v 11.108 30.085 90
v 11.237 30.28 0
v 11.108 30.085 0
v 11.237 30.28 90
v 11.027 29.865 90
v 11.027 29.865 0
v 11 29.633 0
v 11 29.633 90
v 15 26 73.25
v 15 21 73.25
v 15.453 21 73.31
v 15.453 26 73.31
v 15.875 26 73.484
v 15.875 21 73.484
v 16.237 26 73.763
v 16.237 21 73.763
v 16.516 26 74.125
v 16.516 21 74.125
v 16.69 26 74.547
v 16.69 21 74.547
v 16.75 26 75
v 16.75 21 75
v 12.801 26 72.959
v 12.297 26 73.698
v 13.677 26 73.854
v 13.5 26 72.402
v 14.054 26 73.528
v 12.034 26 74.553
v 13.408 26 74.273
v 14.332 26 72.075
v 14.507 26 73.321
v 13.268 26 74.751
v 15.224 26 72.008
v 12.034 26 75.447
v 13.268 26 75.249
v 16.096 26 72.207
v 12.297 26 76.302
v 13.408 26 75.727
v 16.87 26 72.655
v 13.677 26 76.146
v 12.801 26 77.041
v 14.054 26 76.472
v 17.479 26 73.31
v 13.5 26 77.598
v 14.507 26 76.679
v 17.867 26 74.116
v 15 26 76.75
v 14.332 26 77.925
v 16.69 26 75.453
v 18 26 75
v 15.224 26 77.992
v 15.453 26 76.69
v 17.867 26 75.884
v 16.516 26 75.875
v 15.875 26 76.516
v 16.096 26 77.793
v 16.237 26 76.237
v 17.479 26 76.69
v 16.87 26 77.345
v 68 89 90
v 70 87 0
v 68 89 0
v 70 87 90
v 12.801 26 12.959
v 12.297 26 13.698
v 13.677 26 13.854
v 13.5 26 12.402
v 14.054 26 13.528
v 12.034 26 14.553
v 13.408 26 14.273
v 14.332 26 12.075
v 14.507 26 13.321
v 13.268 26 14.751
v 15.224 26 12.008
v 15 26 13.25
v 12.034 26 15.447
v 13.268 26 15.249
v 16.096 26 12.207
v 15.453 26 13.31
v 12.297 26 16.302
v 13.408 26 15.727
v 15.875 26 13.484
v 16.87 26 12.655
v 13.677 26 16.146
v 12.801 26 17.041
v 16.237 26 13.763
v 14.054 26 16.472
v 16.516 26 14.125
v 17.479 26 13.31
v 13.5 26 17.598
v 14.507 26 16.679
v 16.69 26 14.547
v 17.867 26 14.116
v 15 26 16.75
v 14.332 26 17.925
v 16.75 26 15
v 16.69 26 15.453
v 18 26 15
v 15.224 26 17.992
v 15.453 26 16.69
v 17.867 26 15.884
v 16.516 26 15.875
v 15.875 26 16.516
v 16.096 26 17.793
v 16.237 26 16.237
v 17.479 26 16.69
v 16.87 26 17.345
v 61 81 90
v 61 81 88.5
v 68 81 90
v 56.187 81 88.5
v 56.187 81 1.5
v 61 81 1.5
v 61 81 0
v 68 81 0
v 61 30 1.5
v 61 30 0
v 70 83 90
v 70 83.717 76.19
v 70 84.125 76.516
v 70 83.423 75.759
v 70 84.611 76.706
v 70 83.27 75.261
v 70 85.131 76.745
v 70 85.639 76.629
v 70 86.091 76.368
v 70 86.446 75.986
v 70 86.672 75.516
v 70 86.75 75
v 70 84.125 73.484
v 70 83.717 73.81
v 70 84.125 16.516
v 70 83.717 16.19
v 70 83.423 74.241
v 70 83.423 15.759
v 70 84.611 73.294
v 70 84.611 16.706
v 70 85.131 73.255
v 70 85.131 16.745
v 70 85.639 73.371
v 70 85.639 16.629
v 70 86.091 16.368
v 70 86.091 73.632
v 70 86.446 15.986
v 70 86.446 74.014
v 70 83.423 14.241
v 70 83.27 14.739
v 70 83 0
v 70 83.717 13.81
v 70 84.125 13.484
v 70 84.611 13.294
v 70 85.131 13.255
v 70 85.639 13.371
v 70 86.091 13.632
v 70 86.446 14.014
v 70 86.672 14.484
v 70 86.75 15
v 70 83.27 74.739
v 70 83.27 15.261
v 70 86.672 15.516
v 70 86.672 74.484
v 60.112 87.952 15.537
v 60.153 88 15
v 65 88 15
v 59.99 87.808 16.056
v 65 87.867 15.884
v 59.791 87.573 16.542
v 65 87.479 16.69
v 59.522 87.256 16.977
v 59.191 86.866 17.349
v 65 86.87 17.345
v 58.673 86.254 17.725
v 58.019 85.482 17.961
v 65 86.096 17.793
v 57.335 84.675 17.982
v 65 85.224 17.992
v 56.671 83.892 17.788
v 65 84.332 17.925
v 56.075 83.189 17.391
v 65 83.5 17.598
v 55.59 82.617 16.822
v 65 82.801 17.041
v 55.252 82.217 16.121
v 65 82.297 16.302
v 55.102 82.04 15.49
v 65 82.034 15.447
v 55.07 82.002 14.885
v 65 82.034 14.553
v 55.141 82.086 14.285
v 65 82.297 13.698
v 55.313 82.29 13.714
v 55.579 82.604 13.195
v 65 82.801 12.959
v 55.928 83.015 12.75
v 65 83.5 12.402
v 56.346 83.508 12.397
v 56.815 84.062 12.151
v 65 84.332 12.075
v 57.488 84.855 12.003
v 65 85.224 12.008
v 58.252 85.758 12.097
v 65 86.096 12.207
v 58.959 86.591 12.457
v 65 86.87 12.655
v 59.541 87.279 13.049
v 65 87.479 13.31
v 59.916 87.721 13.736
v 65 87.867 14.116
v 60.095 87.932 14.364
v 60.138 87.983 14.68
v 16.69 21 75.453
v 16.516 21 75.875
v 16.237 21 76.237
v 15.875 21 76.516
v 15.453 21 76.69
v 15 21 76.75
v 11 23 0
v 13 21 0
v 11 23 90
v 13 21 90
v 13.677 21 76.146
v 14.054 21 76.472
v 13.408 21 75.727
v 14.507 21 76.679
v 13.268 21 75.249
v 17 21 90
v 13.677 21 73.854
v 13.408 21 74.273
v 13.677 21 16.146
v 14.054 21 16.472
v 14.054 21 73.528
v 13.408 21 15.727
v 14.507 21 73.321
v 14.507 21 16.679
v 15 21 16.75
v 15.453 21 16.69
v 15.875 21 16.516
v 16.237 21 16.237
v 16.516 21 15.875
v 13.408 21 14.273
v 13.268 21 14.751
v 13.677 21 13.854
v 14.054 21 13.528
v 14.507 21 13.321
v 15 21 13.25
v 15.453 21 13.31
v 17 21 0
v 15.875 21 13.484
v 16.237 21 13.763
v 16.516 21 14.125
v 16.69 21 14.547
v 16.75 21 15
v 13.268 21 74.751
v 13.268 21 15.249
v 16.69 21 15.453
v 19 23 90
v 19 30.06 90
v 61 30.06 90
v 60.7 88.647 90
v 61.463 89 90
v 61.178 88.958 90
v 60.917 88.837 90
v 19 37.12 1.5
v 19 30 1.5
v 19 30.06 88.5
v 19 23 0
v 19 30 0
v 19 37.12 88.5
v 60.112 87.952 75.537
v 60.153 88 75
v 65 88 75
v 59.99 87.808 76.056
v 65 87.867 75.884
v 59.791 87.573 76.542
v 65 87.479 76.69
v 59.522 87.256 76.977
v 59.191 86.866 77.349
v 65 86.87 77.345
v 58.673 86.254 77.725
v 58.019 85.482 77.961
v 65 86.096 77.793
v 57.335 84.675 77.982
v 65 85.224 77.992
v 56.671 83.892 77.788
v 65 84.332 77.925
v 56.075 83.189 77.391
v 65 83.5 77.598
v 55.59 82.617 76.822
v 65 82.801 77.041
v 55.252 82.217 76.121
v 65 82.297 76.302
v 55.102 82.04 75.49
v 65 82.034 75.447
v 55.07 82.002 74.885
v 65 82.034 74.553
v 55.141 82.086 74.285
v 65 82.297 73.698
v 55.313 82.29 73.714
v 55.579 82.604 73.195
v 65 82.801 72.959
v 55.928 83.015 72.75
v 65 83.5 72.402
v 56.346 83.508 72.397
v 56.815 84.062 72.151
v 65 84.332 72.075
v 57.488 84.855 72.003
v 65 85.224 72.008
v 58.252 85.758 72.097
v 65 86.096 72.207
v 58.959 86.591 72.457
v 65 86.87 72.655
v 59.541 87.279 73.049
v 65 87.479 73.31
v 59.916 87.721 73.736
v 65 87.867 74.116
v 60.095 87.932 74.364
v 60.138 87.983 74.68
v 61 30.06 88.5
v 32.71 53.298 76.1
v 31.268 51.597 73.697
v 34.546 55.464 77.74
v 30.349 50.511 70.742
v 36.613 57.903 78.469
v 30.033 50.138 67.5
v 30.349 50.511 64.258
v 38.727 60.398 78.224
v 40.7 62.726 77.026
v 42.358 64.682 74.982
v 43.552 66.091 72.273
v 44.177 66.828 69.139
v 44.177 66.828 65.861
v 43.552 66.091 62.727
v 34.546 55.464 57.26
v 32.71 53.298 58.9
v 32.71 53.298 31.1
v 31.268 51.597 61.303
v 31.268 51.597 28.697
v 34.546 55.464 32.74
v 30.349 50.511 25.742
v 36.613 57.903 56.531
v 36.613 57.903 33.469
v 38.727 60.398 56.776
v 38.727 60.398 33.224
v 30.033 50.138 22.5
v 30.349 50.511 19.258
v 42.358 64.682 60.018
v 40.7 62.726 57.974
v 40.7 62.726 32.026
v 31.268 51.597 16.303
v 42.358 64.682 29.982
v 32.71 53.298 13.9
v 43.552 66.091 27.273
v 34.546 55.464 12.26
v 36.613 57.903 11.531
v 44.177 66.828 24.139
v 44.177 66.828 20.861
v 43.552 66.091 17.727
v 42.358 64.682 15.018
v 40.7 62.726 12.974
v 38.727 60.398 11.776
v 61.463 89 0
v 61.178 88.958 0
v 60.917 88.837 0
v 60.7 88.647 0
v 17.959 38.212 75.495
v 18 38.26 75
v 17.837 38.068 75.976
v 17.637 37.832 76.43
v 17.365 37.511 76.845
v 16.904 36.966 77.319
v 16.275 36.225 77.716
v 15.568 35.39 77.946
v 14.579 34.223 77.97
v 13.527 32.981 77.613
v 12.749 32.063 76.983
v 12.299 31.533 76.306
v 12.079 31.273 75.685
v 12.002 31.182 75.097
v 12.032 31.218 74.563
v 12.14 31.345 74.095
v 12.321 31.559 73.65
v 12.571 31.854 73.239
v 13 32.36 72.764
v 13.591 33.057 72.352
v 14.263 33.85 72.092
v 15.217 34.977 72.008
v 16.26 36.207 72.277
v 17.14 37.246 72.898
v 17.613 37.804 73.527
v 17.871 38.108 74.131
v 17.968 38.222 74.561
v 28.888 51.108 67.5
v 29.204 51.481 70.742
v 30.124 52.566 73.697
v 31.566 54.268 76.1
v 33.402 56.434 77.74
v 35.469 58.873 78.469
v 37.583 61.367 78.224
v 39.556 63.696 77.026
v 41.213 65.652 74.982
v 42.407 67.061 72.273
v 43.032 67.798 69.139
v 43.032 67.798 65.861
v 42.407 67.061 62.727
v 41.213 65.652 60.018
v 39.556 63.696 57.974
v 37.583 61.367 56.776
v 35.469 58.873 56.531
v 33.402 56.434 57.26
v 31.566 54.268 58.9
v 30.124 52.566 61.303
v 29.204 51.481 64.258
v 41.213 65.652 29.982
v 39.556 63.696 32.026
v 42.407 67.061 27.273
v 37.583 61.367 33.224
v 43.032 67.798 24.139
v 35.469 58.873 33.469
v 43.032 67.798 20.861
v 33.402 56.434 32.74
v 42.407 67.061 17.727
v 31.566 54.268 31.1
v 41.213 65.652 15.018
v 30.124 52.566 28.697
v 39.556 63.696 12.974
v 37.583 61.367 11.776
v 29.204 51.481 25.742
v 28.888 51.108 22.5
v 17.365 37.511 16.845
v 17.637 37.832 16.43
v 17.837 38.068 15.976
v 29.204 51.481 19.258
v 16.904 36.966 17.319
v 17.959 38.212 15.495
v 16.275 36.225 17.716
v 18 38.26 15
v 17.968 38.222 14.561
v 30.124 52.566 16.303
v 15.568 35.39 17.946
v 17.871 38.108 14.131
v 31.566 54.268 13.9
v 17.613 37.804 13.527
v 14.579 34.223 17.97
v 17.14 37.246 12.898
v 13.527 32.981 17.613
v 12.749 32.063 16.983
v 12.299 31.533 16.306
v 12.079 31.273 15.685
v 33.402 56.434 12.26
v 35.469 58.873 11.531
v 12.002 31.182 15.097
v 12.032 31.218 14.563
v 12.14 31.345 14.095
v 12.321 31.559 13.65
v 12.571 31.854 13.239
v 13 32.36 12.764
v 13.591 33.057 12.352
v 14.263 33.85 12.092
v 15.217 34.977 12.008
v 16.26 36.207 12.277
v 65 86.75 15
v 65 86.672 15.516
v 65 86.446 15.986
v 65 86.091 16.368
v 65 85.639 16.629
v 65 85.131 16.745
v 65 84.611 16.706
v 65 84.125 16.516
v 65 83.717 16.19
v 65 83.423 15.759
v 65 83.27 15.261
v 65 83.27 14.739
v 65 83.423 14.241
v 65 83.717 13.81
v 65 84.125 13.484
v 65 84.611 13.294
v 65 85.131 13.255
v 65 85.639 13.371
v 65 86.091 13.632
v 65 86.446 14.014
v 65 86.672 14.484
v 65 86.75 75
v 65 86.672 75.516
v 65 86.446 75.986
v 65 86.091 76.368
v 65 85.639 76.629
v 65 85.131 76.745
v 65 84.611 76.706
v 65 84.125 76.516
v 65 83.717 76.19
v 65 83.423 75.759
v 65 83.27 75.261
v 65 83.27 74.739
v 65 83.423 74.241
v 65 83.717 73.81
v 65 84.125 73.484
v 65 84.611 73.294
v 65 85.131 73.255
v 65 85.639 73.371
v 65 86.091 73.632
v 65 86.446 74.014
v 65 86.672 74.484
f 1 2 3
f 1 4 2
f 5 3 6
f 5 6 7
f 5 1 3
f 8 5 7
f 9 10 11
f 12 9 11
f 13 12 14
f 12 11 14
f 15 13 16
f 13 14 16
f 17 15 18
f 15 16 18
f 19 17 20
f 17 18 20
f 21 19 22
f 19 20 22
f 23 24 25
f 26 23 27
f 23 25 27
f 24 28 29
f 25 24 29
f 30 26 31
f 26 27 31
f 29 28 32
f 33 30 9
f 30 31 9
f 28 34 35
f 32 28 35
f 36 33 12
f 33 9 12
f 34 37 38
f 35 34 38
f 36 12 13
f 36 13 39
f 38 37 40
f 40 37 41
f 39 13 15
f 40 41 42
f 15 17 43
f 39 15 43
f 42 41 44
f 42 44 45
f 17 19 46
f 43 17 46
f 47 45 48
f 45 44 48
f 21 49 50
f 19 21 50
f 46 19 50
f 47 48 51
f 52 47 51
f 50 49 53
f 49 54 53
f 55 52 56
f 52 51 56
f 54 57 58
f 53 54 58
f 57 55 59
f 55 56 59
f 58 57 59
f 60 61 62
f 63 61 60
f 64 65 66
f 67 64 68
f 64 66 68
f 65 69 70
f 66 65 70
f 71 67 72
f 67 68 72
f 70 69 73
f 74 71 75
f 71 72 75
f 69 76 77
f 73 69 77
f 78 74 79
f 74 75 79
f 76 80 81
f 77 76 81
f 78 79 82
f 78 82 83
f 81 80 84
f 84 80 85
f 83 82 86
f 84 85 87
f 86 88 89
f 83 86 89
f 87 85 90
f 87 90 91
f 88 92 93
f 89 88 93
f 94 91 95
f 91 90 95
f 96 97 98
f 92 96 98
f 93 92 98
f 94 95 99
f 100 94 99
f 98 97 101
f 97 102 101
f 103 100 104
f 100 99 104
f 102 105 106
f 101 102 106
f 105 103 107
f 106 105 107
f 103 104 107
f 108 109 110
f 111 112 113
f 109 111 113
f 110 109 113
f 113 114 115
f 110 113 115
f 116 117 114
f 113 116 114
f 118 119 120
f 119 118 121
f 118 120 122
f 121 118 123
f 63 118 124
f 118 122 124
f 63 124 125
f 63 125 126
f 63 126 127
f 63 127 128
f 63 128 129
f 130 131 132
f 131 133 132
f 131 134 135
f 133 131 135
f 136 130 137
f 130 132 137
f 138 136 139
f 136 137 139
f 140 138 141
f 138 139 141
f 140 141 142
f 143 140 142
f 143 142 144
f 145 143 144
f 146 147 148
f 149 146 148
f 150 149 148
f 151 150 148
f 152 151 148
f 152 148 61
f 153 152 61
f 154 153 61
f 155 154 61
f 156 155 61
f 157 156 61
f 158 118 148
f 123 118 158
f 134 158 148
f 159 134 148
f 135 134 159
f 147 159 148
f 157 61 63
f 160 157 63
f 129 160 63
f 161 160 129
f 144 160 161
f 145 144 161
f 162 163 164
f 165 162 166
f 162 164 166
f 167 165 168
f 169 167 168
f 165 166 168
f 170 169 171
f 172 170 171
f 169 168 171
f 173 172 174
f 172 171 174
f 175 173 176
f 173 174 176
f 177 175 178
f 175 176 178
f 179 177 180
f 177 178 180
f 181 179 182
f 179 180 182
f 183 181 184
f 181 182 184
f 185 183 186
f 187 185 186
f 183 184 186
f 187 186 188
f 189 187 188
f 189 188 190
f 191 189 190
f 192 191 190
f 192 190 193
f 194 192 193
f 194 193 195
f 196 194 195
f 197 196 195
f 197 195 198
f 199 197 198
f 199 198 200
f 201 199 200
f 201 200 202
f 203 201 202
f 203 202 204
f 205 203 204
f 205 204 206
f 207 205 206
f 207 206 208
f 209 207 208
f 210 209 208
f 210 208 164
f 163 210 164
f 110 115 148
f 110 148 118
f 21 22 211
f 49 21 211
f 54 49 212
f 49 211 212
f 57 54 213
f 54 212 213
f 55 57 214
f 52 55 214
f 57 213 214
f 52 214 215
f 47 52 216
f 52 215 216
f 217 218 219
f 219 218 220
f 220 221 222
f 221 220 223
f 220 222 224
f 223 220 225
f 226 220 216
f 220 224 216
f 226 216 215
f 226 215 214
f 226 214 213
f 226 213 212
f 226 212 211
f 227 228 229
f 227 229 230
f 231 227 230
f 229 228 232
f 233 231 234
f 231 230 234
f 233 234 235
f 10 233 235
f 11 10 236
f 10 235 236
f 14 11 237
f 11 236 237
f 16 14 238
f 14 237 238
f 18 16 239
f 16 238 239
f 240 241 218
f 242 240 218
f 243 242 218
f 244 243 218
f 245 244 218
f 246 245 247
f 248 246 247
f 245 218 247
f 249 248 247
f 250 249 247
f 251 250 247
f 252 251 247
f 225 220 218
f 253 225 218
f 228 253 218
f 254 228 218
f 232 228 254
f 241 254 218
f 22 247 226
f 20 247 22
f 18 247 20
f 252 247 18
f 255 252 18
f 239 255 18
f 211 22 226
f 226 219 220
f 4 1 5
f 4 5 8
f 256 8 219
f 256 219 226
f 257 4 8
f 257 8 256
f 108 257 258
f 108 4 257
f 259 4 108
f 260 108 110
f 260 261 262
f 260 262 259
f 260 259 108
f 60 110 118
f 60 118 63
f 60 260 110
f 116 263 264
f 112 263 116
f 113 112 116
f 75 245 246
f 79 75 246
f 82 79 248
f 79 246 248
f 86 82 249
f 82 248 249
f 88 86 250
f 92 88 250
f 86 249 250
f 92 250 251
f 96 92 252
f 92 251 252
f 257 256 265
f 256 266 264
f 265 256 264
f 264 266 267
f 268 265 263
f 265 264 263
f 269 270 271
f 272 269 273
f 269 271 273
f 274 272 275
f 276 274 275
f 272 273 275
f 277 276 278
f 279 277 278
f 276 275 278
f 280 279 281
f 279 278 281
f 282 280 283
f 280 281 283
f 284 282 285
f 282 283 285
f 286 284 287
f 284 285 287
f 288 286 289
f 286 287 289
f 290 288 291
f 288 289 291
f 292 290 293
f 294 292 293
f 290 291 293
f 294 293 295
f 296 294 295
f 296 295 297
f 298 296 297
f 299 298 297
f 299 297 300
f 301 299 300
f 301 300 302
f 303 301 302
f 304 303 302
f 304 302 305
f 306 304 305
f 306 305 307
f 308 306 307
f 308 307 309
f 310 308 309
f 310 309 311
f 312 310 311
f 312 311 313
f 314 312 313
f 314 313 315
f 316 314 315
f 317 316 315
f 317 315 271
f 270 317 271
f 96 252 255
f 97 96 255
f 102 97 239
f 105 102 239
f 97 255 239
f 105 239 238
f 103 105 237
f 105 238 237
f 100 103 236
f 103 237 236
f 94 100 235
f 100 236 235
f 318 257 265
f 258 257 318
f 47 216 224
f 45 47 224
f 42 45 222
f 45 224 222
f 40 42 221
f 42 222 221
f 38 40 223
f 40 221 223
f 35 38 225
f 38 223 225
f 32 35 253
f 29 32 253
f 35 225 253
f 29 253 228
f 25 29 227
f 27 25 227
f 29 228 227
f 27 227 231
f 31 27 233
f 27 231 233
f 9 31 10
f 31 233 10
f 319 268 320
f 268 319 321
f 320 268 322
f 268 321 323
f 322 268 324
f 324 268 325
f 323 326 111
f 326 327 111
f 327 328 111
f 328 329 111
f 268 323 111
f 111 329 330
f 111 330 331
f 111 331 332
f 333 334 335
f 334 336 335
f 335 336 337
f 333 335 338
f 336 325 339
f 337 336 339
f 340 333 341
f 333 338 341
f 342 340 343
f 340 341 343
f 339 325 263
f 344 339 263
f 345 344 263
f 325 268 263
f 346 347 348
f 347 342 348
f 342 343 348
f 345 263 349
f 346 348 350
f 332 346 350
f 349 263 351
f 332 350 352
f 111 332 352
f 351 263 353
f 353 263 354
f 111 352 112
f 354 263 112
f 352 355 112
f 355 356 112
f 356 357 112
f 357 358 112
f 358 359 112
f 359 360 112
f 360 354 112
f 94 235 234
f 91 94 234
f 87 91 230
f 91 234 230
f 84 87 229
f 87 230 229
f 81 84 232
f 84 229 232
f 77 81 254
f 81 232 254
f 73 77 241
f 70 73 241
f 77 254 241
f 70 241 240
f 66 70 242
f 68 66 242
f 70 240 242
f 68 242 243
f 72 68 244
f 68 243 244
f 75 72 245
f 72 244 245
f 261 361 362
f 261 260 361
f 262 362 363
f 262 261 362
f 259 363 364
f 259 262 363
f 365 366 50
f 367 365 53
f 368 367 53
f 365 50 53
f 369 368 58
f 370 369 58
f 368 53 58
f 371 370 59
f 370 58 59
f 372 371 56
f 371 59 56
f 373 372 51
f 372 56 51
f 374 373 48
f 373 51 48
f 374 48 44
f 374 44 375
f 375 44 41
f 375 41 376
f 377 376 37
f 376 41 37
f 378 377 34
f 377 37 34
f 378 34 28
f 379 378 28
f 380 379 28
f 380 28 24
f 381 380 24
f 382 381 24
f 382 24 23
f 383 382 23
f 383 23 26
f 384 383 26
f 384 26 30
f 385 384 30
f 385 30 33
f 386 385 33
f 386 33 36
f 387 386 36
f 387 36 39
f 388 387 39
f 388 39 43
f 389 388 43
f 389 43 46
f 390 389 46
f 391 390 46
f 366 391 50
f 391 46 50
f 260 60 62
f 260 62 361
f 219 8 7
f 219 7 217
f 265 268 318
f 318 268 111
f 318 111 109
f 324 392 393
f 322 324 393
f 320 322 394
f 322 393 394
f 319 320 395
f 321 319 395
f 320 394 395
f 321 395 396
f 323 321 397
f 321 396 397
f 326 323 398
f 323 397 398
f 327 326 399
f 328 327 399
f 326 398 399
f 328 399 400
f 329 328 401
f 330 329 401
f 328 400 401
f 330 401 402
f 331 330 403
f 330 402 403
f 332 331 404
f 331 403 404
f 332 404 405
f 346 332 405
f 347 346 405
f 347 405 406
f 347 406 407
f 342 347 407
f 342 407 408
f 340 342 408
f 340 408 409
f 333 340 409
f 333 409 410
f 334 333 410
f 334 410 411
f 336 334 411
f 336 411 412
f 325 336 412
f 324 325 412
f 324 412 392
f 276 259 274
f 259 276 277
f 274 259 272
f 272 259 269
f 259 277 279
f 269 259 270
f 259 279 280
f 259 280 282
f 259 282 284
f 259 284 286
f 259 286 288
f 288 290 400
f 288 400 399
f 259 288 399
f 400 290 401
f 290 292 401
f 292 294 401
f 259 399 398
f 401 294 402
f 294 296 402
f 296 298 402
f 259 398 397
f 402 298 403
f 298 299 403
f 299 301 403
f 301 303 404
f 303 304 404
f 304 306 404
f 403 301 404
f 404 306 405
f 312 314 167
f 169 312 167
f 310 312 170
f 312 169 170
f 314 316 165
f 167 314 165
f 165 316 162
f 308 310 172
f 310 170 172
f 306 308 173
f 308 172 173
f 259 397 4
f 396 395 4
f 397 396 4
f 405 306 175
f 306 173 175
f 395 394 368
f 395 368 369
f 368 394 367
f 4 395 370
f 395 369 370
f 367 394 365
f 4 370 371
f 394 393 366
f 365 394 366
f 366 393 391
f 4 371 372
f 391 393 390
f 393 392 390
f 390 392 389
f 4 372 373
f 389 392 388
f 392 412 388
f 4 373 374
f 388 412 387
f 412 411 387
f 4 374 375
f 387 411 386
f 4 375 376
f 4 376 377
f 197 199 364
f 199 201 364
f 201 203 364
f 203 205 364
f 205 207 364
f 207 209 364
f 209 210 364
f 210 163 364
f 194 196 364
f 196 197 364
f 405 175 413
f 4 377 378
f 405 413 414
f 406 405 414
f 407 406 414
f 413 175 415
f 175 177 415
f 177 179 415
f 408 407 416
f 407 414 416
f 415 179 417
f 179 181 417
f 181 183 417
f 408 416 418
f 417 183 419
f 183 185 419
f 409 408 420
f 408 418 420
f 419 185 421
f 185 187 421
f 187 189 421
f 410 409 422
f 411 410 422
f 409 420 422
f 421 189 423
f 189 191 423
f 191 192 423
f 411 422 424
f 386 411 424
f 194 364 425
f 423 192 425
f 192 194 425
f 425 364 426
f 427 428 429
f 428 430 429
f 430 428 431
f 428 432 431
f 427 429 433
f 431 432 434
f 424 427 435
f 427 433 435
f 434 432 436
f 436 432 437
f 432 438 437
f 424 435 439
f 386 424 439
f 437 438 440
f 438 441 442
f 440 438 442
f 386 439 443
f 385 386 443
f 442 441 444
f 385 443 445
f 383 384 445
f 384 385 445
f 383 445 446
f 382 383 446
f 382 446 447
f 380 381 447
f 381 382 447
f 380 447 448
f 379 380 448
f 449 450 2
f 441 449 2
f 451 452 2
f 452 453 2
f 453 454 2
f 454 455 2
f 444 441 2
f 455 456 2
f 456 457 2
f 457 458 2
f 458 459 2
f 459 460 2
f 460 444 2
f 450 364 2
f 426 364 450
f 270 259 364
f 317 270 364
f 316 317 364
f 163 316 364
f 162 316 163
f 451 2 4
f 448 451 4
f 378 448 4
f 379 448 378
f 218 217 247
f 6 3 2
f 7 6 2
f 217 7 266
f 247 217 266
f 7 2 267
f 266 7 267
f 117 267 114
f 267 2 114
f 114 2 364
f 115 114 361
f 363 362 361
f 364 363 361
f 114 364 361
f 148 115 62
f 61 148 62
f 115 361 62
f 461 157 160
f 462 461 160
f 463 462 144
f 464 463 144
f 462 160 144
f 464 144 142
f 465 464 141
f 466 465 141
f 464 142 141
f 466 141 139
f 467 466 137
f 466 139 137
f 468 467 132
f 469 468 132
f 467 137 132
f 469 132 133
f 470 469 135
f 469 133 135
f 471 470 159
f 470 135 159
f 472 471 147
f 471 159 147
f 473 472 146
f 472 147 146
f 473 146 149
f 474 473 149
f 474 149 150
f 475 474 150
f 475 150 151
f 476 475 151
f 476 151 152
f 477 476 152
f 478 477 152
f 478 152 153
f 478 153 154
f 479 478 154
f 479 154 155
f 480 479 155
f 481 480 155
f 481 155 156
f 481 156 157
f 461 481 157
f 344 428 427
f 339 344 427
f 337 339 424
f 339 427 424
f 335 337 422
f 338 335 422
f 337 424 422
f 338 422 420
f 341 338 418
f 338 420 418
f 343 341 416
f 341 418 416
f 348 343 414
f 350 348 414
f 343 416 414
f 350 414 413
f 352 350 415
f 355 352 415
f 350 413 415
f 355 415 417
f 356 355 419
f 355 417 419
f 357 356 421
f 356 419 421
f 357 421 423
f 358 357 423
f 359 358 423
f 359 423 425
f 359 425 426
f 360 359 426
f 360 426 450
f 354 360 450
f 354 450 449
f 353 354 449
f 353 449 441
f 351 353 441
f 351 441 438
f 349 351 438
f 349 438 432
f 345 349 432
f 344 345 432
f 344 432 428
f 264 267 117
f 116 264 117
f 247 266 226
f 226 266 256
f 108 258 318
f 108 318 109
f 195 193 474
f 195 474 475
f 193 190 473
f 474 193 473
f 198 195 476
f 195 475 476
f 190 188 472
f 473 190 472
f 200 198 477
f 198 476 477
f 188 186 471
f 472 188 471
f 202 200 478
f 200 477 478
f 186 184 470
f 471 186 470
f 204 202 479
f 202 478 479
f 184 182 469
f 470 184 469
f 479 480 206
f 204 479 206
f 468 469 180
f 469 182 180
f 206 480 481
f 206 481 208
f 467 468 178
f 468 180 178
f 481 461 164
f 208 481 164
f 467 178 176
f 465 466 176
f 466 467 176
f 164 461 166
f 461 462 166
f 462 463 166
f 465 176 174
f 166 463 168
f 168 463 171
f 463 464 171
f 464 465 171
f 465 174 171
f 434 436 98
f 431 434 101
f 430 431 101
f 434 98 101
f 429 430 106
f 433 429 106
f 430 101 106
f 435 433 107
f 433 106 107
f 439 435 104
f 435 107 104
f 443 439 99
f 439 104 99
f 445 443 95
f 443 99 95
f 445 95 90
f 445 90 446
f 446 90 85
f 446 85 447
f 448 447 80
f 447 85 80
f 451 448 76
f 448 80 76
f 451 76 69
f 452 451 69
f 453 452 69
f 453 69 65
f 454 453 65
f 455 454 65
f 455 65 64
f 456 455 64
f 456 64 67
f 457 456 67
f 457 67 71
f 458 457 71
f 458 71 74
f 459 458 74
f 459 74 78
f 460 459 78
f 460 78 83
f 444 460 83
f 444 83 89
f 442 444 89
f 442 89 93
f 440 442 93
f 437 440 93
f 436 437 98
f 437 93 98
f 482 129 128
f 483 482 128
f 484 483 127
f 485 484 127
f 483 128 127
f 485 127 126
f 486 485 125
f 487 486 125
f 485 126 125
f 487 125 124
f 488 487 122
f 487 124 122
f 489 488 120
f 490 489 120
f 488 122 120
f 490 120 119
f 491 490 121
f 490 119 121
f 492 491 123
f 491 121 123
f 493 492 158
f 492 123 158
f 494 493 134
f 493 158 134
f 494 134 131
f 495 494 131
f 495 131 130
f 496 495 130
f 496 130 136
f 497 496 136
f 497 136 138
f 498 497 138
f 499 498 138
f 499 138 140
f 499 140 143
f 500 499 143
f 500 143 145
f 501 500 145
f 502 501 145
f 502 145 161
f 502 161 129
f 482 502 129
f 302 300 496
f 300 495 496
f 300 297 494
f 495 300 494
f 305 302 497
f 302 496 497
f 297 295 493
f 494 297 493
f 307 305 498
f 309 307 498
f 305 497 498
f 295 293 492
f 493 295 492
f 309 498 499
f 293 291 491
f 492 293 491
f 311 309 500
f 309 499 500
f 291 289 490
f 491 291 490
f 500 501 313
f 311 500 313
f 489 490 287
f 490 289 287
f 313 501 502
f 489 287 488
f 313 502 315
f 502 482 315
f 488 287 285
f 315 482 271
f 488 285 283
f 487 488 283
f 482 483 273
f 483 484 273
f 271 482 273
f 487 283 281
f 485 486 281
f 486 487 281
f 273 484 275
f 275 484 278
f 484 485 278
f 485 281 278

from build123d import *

# Parameters (mm, degrees)
F1_DEPTH  = 90
F2_R      = 11
F3_DEPTH  = 25
F5_DEPTH  = 25
F6_R      = 1.75
F7_DEPTH  = 25
F9_R      = 3
F10_DEPTH = 25
F12_R     = 3
F13_DEPTH = 25
F14_SIZE  = 2
F15_R     = 1
F17_DEPTH = 1.5
F19_DEPTH = 1.5


with BuildPart() as f1:
    # F0 (on Top) → F1 (new body)
    with BuildSketch(Plane.XY):
        Polygon((70, 89), (61, 89), (11, 30), (11, 21), (19, 21), (19, 30), (19, 33.3303359461), (19, 37.1198922439), (56.1865319967, 81), (61, 81), (70, 81), align=None)
    extrude(amount=F1_DEPTH)

    # F2 (on face) → F3 (cut)
    with BuildSketch(Plane(origin=(-8.3947500418, 7.1141949507, 0), x_dir=(-0.6465216954, -0.7628956006, 0), z_dir=(-0.7628956006, 0.6465216954, 0))):
        with Locations((-68.6670692686, 67.5)):
            Circle(F2_R)
        with Locations((-68.6670692686, 22.5)):
            Circle(F2_R)
    extrude(amount=-F3_DEPTH, mode=Mode.SUBTRACT)

    # F4 (on face) → F5 (cut)
    with BuildSketch(Plane.XZ.offset(-21)):
        with BuildLine():
            ThreePointArc((16.75, 75), (16.2374368671, 76.2374368671), (15, 76.75))
            Line((15, 76.75), (15, 73.25))
            ThreePointArc((15, 73.25), (16.2374368671, 73.7625631329), (16.75, 75))
        make_face()
        with BuildLine():
            ThreePointArc((16.75, 15), (16.2374368671, 16.2374368671), (15, 16.75))
            Line((15, 16.75), (15, 13.25))
            ThreePointArc((15, 13.25), (16.2374368671, 13.7625631329), (16.75, 15))
        make_face()
        with BuildLine():
            Line((15, 13.25), (15, 16.75))
            ThreePointArc((15, 16.75), (13.25, 15), (15, 13.25))
        make_face()
        with BuildLine():
            Line((15, 73.25), (15, 76.75))
            ThreePointArc((15, 76.75), (13.25, 75), (15, 73.25))
        make_face()
    extrude(amount=-F5_DEPTH, mode=Mode.SUBTRACT)

    # F6 (on face) → F7 (cut)
    with BuildSketch(Plane.YZ.offset(70)):
        with Locations((85, 75)):
            Circle(F6_R)
        with Locations((85, 15)):
            Circle(F6_R)
    extrude(amount=-F7_DEPTH, mode=Mode.SUBTRACT)

    # F9 (on offset) → F10 (cut)
    with BuildSketch(Plane.YZ.offset(65)):
        with Locations((85, 75)):
            Circle(F9_R)
        with Locations((85, 15)):
            Circle(F9_R)
    extrude(amount=-F10_DEPTH, mode=Mode.SUBTRACT)

    # F12 (on offset) → F13 (cut)
    with BuildSketch(Plane.XZ.offset(-26)):
        with Locations((15, 75)):
            Circle(F12_R)
        with Locations((15, 15)):
            Circle(F12_R)
    extrude(amount=-F13_DEPTH, mode=Mode.SUBTRACT)

    # F14
    f14_edges = [f1.edges().sort_by_distance(p)[0] for p in [
        (70, 81, 45),
        (70, 89, 45),
        (19, 21, 45),
        (11, 21, 45),
    ]]
    chamfer(f14_edges, length=F14_SIZE)

    # F15
    f15_edges = [f1.edges().sort_by_distance(p)[0] for p in [
        (61, 89, 45),
        (11, 30, 45),
    ]]
    fillet(f15_edges, radius=F15_R)

    # F16 (on face) → F17 (join)
    with BuildSketch(Plane.XY.offset(90)):
        Polygon((19, 37.1198922439), (19, 30.0599461219), (61, 30.0599461219), (61, 81), (56.1865319967, 81), align=None)
    extrude(amount=-F17_DEPTH)

    # F18 (on face) → F19 (join)
    with BuildSketch(Plane.XY):
        Polygon((61, 30), (61, 81), (56.1865319967, 81), (19, 37.1198922439), (19, 30), align=None)
    extrude(amount=F19_DEPTH)


solid = f1.part
